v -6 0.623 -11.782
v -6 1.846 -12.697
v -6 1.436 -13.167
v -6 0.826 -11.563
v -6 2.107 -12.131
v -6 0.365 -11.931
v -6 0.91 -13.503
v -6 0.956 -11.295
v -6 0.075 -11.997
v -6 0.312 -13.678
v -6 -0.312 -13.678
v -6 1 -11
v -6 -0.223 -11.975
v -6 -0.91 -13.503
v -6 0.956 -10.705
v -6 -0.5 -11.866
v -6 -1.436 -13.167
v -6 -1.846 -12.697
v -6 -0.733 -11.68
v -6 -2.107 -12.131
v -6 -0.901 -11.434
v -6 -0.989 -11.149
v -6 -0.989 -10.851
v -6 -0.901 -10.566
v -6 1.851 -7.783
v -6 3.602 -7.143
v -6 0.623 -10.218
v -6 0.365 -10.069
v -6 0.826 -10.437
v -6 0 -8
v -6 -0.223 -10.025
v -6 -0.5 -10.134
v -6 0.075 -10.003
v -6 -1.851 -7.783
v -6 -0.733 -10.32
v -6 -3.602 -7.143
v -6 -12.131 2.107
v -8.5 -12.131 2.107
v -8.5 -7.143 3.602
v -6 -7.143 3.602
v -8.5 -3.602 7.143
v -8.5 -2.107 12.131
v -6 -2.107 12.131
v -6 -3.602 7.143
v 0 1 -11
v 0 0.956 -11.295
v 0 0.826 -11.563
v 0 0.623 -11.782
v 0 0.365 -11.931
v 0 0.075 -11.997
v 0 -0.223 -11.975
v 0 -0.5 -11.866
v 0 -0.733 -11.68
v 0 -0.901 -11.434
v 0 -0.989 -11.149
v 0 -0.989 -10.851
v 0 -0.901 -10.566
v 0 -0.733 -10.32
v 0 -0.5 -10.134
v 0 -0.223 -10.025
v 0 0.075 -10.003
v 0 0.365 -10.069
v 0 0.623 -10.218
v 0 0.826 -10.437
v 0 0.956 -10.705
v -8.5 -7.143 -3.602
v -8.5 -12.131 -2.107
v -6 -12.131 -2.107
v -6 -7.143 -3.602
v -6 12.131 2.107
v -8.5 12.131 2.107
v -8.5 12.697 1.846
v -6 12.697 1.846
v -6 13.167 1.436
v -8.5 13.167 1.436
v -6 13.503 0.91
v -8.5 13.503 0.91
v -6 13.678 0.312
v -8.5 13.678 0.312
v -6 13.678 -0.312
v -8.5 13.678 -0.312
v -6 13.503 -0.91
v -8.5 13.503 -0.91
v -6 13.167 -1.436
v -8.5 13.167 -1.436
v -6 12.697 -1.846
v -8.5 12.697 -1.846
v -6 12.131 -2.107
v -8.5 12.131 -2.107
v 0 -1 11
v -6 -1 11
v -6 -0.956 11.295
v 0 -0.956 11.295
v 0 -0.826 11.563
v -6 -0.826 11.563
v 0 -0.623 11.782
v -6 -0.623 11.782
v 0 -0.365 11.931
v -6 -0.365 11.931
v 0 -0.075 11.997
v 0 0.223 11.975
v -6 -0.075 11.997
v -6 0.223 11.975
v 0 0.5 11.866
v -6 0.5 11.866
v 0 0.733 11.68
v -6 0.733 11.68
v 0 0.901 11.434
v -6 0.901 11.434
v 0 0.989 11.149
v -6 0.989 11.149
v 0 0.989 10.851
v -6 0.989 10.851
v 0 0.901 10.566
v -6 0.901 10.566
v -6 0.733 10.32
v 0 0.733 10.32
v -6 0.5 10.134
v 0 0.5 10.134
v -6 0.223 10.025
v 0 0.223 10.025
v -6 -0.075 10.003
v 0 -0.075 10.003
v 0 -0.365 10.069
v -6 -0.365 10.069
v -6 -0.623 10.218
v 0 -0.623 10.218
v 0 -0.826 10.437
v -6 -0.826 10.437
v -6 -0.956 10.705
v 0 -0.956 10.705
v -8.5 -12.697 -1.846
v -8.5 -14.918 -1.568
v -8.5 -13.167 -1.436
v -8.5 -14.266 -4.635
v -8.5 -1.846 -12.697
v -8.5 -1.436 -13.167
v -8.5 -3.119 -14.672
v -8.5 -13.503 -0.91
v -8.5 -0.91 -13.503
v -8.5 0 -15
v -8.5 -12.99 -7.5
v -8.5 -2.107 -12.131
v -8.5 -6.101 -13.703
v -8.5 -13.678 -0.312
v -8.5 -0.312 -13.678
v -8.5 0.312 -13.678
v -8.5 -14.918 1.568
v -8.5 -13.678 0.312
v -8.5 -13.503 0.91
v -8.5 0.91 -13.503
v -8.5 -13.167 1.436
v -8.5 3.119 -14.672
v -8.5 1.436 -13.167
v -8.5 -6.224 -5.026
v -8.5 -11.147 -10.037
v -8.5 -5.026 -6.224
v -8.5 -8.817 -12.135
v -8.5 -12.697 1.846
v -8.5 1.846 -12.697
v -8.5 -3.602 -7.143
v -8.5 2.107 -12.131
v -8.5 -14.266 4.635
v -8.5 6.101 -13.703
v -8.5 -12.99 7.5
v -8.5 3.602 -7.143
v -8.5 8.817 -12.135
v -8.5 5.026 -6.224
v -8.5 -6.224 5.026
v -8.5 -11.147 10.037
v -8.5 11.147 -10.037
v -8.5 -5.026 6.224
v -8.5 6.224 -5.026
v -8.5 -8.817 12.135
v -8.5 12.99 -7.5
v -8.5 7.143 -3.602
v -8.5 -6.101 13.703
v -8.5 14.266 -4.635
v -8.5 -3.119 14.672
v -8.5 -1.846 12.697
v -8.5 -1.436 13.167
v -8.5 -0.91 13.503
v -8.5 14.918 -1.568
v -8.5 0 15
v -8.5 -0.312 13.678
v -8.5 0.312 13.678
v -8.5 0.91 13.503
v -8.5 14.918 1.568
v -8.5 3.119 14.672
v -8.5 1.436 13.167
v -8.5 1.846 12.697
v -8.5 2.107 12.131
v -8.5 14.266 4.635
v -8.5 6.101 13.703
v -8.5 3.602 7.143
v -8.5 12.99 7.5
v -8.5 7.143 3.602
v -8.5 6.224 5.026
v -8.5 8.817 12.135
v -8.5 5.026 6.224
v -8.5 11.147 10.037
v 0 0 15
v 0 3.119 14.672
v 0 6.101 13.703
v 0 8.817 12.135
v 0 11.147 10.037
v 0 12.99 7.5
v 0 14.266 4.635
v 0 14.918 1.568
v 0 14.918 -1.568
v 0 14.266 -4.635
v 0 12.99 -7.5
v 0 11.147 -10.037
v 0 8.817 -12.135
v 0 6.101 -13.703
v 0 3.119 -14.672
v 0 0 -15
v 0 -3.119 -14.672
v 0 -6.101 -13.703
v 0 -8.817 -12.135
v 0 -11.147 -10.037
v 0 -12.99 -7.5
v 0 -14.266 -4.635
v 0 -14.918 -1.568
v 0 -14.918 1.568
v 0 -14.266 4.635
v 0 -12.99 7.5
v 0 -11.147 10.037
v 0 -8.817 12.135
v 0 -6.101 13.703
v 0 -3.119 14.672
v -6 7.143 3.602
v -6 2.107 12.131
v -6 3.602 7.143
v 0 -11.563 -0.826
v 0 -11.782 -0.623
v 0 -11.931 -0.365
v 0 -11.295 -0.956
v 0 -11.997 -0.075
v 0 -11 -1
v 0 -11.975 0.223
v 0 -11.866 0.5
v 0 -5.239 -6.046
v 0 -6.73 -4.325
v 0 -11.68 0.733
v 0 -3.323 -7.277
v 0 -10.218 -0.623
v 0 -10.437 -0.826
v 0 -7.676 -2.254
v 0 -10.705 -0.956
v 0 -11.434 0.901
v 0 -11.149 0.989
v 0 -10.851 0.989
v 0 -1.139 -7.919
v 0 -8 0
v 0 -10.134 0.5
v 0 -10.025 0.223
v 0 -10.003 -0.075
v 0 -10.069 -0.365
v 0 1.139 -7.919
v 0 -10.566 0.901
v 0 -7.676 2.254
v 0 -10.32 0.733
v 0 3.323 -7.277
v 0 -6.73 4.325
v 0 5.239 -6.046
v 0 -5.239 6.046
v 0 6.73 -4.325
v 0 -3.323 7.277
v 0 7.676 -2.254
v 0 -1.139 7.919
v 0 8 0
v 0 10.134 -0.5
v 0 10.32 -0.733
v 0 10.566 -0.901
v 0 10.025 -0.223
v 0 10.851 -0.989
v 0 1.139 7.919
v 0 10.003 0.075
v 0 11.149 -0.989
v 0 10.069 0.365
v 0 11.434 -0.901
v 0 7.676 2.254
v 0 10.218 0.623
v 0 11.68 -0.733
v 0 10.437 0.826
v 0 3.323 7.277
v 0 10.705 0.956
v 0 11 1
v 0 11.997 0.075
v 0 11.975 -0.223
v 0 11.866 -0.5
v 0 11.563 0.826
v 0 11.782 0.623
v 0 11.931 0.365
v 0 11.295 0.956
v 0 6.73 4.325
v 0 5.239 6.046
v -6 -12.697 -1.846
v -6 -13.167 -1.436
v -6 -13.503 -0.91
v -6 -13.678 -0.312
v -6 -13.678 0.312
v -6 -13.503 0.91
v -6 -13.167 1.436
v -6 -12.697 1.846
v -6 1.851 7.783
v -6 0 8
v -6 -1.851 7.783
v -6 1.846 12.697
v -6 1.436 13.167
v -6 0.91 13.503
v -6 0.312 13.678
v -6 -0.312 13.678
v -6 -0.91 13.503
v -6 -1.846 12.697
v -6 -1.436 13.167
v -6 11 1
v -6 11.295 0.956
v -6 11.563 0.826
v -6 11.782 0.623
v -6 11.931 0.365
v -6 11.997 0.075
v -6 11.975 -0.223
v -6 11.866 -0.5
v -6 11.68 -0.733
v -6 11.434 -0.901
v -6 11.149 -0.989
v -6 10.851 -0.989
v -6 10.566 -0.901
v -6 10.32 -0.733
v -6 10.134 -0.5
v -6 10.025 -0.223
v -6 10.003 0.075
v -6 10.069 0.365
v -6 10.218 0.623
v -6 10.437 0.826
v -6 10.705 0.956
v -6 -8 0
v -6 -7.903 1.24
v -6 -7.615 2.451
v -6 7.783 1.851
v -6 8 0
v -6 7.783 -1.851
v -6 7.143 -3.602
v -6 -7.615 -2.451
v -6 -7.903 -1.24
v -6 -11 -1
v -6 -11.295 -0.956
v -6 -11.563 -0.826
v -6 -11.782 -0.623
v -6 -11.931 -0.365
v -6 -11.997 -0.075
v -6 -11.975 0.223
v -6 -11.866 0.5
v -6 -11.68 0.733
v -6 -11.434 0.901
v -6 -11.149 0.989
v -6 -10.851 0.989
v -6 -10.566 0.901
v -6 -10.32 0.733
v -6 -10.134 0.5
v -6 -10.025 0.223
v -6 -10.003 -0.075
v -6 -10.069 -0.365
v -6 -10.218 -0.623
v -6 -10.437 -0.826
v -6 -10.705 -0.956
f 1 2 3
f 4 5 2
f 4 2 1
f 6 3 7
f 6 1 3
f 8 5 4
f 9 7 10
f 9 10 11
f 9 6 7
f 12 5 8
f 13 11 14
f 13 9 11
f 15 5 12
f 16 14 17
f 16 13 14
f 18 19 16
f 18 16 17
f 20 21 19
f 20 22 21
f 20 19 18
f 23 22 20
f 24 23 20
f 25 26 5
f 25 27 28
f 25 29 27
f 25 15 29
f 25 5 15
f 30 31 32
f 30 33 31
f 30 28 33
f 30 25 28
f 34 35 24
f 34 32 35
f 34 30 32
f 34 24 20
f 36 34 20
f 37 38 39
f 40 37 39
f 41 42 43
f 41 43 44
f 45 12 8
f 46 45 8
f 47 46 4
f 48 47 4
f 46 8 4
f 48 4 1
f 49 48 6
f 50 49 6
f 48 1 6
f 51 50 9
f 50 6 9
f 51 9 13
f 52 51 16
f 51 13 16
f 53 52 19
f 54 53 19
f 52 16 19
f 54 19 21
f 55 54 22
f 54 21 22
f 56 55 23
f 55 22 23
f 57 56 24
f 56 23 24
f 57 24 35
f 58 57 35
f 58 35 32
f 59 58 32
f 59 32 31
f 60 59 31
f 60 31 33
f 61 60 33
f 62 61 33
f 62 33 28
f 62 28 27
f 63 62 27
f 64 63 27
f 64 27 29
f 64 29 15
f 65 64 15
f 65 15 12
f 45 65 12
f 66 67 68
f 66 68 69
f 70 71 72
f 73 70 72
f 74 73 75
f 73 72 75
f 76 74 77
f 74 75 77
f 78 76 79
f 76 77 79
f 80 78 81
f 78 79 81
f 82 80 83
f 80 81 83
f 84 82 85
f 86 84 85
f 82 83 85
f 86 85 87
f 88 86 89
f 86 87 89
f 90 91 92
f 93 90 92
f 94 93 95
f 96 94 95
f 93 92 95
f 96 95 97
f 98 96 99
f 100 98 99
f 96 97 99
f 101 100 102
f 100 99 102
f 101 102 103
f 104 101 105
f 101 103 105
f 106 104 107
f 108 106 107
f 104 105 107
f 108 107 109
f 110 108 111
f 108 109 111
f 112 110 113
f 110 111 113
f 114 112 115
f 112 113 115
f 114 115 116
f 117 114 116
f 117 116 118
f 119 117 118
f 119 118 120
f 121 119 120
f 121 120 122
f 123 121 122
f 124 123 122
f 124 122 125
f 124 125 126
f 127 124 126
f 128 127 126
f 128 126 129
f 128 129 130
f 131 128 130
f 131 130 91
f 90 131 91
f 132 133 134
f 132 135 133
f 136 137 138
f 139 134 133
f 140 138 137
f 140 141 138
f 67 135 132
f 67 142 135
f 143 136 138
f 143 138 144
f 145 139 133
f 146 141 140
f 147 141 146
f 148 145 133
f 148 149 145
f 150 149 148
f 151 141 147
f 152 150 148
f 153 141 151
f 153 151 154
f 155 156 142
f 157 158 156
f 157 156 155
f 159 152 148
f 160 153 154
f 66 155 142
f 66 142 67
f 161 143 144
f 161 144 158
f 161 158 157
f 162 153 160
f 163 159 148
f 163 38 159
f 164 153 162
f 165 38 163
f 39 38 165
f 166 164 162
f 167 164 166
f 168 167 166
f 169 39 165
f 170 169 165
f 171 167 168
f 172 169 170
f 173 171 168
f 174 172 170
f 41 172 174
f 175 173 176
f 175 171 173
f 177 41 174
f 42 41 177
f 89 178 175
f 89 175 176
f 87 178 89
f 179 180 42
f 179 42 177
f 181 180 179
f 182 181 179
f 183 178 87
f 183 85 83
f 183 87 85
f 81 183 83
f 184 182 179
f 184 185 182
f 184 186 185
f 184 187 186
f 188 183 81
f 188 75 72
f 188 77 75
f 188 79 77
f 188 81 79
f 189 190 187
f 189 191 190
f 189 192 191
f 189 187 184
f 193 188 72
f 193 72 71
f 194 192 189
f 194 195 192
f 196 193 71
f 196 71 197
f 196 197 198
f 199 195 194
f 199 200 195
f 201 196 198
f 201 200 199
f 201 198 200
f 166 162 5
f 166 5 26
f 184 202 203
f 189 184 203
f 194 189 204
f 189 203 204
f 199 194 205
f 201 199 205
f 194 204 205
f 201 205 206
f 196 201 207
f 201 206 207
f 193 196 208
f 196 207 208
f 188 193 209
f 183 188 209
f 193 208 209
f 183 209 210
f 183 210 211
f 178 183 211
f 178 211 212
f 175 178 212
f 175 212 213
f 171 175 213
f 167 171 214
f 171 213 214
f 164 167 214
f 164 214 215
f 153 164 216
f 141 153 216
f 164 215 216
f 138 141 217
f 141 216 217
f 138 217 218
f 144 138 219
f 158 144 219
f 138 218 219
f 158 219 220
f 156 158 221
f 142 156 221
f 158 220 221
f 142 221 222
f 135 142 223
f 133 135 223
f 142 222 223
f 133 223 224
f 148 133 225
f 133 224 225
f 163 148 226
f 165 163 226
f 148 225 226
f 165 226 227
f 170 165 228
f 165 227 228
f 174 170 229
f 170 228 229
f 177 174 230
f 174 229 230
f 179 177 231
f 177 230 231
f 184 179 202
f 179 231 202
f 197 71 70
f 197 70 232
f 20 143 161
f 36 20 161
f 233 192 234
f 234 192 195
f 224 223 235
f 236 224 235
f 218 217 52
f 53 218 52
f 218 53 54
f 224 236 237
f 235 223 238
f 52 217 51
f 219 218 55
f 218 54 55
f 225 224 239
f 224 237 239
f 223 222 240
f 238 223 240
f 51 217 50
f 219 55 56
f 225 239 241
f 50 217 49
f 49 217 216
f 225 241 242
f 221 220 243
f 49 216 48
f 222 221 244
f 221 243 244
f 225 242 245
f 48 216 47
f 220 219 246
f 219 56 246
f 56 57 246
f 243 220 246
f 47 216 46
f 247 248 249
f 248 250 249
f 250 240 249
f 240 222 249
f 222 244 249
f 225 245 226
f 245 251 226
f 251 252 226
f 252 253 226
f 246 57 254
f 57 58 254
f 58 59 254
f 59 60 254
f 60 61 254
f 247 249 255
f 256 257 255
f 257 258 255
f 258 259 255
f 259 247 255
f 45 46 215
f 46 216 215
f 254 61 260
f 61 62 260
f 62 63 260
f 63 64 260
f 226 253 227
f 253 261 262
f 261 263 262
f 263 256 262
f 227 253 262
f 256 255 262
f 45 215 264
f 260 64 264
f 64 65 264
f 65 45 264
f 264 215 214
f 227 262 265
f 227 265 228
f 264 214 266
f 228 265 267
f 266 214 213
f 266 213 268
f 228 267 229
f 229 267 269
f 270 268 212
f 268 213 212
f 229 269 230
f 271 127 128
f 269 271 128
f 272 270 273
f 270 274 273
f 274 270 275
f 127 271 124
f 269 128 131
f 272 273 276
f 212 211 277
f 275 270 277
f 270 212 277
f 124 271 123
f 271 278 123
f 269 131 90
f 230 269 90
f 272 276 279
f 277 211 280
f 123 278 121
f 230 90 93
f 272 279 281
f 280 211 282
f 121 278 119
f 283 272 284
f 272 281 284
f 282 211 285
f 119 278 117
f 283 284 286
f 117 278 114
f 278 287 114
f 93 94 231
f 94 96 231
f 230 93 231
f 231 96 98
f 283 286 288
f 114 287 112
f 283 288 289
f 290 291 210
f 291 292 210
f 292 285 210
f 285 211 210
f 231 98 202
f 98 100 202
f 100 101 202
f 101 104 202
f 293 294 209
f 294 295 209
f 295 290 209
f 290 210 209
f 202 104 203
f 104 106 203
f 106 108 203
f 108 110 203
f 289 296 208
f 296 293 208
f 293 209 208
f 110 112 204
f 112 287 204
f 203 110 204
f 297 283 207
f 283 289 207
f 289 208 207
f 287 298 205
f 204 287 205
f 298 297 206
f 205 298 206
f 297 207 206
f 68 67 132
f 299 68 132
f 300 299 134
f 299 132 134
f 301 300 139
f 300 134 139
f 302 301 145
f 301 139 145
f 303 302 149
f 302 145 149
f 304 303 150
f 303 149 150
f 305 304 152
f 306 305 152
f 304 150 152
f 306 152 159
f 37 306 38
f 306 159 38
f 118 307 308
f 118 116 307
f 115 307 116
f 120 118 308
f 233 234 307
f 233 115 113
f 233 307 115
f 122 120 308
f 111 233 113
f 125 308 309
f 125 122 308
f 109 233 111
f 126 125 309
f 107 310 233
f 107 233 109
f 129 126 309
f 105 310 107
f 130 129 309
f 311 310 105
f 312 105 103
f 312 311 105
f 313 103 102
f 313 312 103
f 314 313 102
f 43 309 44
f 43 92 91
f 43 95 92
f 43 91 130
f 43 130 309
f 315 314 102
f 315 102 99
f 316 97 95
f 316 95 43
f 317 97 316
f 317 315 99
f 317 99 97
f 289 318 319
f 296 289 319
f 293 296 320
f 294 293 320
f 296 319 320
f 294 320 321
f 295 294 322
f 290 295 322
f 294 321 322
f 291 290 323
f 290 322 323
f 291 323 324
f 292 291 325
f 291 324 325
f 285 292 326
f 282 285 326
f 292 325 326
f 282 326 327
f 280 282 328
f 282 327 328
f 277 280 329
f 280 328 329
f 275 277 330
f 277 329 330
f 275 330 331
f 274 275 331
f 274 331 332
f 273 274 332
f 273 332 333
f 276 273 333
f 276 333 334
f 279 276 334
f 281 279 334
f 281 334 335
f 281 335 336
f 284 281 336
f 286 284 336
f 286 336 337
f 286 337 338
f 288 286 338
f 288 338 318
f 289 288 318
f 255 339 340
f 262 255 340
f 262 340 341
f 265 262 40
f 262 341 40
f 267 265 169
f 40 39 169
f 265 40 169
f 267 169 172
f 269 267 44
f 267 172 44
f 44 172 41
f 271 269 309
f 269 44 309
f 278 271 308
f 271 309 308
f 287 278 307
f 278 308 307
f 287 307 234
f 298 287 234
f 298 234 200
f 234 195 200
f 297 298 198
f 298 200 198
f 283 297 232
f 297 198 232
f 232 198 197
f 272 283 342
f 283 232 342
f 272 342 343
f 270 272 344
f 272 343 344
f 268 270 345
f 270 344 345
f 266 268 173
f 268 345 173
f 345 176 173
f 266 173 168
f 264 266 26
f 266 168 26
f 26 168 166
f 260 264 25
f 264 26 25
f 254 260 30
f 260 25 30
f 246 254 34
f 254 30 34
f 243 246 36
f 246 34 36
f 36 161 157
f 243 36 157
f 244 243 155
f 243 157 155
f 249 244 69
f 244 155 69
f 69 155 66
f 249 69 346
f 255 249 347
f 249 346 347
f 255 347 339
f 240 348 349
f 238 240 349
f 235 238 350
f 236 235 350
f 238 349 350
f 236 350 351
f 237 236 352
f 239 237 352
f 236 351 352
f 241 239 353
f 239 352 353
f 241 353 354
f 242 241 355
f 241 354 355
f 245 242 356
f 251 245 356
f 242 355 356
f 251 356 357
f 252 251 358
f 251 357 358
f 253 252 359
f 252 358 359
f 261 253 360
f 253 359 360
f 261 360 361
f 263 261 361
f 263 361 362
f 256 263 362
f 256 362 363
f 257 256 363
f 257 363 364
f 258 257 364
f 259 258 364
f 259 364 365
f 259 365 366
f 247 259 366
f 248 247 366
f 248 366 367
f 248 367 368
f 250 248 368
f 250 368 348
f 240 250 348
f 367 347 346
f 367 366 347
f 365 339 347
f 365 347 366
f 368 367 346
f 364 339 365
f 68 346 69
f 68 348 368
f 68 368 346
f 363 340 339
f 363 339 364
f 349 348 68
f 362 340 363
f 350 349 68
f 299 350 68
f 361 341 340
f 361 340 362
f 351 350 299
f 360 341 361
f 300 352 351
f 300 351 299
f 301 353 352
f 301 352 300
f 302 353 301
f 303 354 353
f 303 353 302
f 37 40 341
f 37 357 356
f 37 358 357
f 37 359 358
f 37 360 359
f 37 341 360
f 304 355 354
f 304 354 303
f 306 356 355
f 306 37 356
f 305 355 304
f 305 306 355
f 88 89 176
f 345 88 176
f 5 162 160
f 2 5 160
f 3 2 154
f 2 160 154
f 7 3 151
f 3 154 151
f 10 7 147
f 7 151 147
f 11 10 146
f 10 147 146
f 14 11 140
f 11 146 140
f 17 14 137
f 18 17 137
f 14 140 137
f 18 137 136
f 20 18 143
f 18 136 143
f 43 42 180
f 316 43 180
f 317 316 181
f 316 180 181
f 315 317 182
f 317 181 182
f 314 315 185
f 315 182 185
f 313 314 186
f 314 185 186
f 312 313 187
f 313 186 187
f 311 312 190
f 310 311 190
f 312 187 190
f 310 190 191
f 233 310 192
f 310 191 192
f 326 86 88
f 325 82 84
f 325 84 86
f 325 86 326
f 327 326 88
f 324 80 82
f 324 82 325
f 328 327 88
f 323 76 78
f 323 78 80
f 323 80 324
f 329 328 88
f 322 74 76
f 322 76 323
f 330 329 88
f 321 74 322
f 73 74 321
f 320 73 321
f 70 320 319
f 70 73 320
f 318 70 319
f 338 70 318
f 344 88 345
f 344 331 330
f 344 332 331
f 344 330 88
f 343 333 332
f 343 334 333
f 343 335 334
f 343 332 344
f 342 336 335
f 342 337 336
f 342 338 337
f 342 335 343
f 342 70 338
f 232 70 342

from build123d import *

# Parameters (mm, degrees)
SKETCH093_R             = 6.5
SKETCH093_R_2           = 2.5
PAD050_DEPTH            = 6
SKETCH094_R             = 5
SKETCH094_R_2           = 2.522437
PAD051_DEPTH            = 7
SKETCH095_R             = 6.5
SKETCH095_R_2           = 2.522437
PAD052_DEPTH            = 1
SKETCH096_R             = 1
PAD053_DEPTH            = 7
BODY035_ROLL_ANGLE      = 135
BODY035_PLACEMENT_ANGLE = 180
SKETCH100_R             = 15
PAD054_DEPTH            = 8.5
POCKET031_DEPTH         = 2.5
POLARPATTERN023_COUNT   = 4
SKETCH097_R             = 1
HOLE008_DEPTH           = 25
POLARPATTERN022_COUNT   = 4
SKETCH098_R             = 4
POCKET030_DEPTH         = 6.001
BODY036_PLACEMENT_ANGLE = 90
SKETCH102_R             = 8
POCKET032_DEPTH         = 8.501


with BuildPart() as polea007:
    # Sketch093 → Pad050 (new body)
    with BuildSketch(Plane.YZ):
        Circle(SKETCH093_R)
        Circle(SKETCH093_R_2, mode=Mode.SUBTRACT)
    extrude(amount=PAD050_DEPTH)

    # Sketch094 (on Face3 of Pad050) → Pad051 (join)
    with BuildSketch(Plane(origin=(0, 0, 0), x_dir=(0, 1, 0), z_dir=(-1, 0, 0))):
        Circle(SKETCH094_R)
        Circle(SKETCH094_R_2, mode=Mode.SUBTRACT)
    extrude(amount=PAD051_DEPTH)

    # Sketch095 (on Face6 of Pad051) → Pad052 (join)
    with BuildSketch(Plane(origin=(-7, 0, 0), x_dir=(0, 1, 0), z_dir=(-1, 0, 0))):
        Circle(SKETCH095_R)
        Circle(SKETCH095_R_2, mode=Mode.SUBTRACT)
    extrude(amount=PAD052_DEPTH)

    # Sketch096 → Pad053 (join)
    with BuildSketch(Plane.XZ):
        with Locations((3, 0)):
            Circle(SKETCH096_R)
    extrude(amount=PAD053_DEPTH)


with BuildPart() as polea007_1:
    # Body035 roll: moved
    add(polea007.part.rotate(Axis((0, 0, 0), (1, 0, 0)), BODY035_ROLL_ANGLE))


with BuildPart() as polea007_2:
    # Body035 placement: moved
    add(polea007_1.part.rotate(Axis((0, 0, 0), (0, 0, 1)), BODY035_PLACEMENT_ANGLE))


with BuildPart() as body037:
    # Sketch100 → Pad054 (new body)
    with BuildSketch(Plane.XY):
        Circle(SKETCH100_R)
    extrude(amount=PAD054_DEPTH)

    # Sketch099 (on Face3 of Pad054) → Pocket031 (cut)
    with BuildSketch(Plane.XY.offset(8.5)):
        with BuildLine():
            ThreePointArc((-5.26869, 1.578261), (0, -5.5), (5.26869, 1.578261))
            Line((2.107476, 12.131304), (5.26869, 1.578261))
            ThreePointArc((2.107476, 12.131304), (0, 13.7), (-2.107476, 12.131304))
            Line((-2.107476, 12.131304), (-5.26869, 1.578261))
        make_face()
    pocket031 = extrude(amount=-POCKET031_DEPTH, mode=Mode.SUBTRACT)

    # PolarPattern023: Pocket031 ×4 about axis
    polarpattern023_axis = Axis((0, 0, 8.5), (0, 0, 1))
    for i in range(1, POLARPATTERN023_COUNT):
        add(pocket031.rotate(polarpattern023_axis, i * 360 / POLARPATTERN023_COUNT), mode=Mode.SUBTRACT)

    # Sketch097 (on Face21 of PolarPattern023) → Hole008 (cut)
    with BuildSketch(Plane.XY.offset(6)):
        with Locations((0, 11)):
            Circle(SKETCH097_R)
    hole008 = extrude(amount=-HOLE008_DEPTH, mode=Mode.SUBTRACT)

    # PolarPattern022: Hole008 ×4 about axis
    polarpattern022_axis = Axis((0, 0, 6), (0, 0, 1))
    for i in range(1, POLARPATTERN022_COUNT):
        add(hole008.rotate(polarpattern022_axis, i * 360 / POLARPATTERN022_COUNT), mode=Mode.SUBTRACT)

    # Sketch098 (on Face25 of PolarPattern022) → Pocket030 (cut, through all)
    with BuildSketch(Plane.XY.offset(6)):
        Circle(SKETCH098_R)
    extrude(amount=-POCKET030_DEPTH, mode=Mode.SUBTRACT)


with BuildPart() as body037_1:
    # Body036 placement: moved
    add(body037.part.moved(Location((0, 0, 0))).rotate(Axis((0, 0, 0), (0, -1, 0)), BODY036_PLACEMENT_ANGLE))

    # Cut006: cut polea007
    add(polea007_2.part, mode=Mode.SUBTRACT)

    # Sketch102 (on Face3 of BaseFeature006) → Pocket032 (cut, through all)
    with BuildSketch(Plane(origin=(-8.5, 0, 0), x_dir=(0, -1, 0), z_dir=(-1, 0, 0))):
        Circle(SKETCH102_R)
    extrude(amount=-POCKET032_DEPTH, mode=Mode.SUBTRACT)


solid = body037_1.part
